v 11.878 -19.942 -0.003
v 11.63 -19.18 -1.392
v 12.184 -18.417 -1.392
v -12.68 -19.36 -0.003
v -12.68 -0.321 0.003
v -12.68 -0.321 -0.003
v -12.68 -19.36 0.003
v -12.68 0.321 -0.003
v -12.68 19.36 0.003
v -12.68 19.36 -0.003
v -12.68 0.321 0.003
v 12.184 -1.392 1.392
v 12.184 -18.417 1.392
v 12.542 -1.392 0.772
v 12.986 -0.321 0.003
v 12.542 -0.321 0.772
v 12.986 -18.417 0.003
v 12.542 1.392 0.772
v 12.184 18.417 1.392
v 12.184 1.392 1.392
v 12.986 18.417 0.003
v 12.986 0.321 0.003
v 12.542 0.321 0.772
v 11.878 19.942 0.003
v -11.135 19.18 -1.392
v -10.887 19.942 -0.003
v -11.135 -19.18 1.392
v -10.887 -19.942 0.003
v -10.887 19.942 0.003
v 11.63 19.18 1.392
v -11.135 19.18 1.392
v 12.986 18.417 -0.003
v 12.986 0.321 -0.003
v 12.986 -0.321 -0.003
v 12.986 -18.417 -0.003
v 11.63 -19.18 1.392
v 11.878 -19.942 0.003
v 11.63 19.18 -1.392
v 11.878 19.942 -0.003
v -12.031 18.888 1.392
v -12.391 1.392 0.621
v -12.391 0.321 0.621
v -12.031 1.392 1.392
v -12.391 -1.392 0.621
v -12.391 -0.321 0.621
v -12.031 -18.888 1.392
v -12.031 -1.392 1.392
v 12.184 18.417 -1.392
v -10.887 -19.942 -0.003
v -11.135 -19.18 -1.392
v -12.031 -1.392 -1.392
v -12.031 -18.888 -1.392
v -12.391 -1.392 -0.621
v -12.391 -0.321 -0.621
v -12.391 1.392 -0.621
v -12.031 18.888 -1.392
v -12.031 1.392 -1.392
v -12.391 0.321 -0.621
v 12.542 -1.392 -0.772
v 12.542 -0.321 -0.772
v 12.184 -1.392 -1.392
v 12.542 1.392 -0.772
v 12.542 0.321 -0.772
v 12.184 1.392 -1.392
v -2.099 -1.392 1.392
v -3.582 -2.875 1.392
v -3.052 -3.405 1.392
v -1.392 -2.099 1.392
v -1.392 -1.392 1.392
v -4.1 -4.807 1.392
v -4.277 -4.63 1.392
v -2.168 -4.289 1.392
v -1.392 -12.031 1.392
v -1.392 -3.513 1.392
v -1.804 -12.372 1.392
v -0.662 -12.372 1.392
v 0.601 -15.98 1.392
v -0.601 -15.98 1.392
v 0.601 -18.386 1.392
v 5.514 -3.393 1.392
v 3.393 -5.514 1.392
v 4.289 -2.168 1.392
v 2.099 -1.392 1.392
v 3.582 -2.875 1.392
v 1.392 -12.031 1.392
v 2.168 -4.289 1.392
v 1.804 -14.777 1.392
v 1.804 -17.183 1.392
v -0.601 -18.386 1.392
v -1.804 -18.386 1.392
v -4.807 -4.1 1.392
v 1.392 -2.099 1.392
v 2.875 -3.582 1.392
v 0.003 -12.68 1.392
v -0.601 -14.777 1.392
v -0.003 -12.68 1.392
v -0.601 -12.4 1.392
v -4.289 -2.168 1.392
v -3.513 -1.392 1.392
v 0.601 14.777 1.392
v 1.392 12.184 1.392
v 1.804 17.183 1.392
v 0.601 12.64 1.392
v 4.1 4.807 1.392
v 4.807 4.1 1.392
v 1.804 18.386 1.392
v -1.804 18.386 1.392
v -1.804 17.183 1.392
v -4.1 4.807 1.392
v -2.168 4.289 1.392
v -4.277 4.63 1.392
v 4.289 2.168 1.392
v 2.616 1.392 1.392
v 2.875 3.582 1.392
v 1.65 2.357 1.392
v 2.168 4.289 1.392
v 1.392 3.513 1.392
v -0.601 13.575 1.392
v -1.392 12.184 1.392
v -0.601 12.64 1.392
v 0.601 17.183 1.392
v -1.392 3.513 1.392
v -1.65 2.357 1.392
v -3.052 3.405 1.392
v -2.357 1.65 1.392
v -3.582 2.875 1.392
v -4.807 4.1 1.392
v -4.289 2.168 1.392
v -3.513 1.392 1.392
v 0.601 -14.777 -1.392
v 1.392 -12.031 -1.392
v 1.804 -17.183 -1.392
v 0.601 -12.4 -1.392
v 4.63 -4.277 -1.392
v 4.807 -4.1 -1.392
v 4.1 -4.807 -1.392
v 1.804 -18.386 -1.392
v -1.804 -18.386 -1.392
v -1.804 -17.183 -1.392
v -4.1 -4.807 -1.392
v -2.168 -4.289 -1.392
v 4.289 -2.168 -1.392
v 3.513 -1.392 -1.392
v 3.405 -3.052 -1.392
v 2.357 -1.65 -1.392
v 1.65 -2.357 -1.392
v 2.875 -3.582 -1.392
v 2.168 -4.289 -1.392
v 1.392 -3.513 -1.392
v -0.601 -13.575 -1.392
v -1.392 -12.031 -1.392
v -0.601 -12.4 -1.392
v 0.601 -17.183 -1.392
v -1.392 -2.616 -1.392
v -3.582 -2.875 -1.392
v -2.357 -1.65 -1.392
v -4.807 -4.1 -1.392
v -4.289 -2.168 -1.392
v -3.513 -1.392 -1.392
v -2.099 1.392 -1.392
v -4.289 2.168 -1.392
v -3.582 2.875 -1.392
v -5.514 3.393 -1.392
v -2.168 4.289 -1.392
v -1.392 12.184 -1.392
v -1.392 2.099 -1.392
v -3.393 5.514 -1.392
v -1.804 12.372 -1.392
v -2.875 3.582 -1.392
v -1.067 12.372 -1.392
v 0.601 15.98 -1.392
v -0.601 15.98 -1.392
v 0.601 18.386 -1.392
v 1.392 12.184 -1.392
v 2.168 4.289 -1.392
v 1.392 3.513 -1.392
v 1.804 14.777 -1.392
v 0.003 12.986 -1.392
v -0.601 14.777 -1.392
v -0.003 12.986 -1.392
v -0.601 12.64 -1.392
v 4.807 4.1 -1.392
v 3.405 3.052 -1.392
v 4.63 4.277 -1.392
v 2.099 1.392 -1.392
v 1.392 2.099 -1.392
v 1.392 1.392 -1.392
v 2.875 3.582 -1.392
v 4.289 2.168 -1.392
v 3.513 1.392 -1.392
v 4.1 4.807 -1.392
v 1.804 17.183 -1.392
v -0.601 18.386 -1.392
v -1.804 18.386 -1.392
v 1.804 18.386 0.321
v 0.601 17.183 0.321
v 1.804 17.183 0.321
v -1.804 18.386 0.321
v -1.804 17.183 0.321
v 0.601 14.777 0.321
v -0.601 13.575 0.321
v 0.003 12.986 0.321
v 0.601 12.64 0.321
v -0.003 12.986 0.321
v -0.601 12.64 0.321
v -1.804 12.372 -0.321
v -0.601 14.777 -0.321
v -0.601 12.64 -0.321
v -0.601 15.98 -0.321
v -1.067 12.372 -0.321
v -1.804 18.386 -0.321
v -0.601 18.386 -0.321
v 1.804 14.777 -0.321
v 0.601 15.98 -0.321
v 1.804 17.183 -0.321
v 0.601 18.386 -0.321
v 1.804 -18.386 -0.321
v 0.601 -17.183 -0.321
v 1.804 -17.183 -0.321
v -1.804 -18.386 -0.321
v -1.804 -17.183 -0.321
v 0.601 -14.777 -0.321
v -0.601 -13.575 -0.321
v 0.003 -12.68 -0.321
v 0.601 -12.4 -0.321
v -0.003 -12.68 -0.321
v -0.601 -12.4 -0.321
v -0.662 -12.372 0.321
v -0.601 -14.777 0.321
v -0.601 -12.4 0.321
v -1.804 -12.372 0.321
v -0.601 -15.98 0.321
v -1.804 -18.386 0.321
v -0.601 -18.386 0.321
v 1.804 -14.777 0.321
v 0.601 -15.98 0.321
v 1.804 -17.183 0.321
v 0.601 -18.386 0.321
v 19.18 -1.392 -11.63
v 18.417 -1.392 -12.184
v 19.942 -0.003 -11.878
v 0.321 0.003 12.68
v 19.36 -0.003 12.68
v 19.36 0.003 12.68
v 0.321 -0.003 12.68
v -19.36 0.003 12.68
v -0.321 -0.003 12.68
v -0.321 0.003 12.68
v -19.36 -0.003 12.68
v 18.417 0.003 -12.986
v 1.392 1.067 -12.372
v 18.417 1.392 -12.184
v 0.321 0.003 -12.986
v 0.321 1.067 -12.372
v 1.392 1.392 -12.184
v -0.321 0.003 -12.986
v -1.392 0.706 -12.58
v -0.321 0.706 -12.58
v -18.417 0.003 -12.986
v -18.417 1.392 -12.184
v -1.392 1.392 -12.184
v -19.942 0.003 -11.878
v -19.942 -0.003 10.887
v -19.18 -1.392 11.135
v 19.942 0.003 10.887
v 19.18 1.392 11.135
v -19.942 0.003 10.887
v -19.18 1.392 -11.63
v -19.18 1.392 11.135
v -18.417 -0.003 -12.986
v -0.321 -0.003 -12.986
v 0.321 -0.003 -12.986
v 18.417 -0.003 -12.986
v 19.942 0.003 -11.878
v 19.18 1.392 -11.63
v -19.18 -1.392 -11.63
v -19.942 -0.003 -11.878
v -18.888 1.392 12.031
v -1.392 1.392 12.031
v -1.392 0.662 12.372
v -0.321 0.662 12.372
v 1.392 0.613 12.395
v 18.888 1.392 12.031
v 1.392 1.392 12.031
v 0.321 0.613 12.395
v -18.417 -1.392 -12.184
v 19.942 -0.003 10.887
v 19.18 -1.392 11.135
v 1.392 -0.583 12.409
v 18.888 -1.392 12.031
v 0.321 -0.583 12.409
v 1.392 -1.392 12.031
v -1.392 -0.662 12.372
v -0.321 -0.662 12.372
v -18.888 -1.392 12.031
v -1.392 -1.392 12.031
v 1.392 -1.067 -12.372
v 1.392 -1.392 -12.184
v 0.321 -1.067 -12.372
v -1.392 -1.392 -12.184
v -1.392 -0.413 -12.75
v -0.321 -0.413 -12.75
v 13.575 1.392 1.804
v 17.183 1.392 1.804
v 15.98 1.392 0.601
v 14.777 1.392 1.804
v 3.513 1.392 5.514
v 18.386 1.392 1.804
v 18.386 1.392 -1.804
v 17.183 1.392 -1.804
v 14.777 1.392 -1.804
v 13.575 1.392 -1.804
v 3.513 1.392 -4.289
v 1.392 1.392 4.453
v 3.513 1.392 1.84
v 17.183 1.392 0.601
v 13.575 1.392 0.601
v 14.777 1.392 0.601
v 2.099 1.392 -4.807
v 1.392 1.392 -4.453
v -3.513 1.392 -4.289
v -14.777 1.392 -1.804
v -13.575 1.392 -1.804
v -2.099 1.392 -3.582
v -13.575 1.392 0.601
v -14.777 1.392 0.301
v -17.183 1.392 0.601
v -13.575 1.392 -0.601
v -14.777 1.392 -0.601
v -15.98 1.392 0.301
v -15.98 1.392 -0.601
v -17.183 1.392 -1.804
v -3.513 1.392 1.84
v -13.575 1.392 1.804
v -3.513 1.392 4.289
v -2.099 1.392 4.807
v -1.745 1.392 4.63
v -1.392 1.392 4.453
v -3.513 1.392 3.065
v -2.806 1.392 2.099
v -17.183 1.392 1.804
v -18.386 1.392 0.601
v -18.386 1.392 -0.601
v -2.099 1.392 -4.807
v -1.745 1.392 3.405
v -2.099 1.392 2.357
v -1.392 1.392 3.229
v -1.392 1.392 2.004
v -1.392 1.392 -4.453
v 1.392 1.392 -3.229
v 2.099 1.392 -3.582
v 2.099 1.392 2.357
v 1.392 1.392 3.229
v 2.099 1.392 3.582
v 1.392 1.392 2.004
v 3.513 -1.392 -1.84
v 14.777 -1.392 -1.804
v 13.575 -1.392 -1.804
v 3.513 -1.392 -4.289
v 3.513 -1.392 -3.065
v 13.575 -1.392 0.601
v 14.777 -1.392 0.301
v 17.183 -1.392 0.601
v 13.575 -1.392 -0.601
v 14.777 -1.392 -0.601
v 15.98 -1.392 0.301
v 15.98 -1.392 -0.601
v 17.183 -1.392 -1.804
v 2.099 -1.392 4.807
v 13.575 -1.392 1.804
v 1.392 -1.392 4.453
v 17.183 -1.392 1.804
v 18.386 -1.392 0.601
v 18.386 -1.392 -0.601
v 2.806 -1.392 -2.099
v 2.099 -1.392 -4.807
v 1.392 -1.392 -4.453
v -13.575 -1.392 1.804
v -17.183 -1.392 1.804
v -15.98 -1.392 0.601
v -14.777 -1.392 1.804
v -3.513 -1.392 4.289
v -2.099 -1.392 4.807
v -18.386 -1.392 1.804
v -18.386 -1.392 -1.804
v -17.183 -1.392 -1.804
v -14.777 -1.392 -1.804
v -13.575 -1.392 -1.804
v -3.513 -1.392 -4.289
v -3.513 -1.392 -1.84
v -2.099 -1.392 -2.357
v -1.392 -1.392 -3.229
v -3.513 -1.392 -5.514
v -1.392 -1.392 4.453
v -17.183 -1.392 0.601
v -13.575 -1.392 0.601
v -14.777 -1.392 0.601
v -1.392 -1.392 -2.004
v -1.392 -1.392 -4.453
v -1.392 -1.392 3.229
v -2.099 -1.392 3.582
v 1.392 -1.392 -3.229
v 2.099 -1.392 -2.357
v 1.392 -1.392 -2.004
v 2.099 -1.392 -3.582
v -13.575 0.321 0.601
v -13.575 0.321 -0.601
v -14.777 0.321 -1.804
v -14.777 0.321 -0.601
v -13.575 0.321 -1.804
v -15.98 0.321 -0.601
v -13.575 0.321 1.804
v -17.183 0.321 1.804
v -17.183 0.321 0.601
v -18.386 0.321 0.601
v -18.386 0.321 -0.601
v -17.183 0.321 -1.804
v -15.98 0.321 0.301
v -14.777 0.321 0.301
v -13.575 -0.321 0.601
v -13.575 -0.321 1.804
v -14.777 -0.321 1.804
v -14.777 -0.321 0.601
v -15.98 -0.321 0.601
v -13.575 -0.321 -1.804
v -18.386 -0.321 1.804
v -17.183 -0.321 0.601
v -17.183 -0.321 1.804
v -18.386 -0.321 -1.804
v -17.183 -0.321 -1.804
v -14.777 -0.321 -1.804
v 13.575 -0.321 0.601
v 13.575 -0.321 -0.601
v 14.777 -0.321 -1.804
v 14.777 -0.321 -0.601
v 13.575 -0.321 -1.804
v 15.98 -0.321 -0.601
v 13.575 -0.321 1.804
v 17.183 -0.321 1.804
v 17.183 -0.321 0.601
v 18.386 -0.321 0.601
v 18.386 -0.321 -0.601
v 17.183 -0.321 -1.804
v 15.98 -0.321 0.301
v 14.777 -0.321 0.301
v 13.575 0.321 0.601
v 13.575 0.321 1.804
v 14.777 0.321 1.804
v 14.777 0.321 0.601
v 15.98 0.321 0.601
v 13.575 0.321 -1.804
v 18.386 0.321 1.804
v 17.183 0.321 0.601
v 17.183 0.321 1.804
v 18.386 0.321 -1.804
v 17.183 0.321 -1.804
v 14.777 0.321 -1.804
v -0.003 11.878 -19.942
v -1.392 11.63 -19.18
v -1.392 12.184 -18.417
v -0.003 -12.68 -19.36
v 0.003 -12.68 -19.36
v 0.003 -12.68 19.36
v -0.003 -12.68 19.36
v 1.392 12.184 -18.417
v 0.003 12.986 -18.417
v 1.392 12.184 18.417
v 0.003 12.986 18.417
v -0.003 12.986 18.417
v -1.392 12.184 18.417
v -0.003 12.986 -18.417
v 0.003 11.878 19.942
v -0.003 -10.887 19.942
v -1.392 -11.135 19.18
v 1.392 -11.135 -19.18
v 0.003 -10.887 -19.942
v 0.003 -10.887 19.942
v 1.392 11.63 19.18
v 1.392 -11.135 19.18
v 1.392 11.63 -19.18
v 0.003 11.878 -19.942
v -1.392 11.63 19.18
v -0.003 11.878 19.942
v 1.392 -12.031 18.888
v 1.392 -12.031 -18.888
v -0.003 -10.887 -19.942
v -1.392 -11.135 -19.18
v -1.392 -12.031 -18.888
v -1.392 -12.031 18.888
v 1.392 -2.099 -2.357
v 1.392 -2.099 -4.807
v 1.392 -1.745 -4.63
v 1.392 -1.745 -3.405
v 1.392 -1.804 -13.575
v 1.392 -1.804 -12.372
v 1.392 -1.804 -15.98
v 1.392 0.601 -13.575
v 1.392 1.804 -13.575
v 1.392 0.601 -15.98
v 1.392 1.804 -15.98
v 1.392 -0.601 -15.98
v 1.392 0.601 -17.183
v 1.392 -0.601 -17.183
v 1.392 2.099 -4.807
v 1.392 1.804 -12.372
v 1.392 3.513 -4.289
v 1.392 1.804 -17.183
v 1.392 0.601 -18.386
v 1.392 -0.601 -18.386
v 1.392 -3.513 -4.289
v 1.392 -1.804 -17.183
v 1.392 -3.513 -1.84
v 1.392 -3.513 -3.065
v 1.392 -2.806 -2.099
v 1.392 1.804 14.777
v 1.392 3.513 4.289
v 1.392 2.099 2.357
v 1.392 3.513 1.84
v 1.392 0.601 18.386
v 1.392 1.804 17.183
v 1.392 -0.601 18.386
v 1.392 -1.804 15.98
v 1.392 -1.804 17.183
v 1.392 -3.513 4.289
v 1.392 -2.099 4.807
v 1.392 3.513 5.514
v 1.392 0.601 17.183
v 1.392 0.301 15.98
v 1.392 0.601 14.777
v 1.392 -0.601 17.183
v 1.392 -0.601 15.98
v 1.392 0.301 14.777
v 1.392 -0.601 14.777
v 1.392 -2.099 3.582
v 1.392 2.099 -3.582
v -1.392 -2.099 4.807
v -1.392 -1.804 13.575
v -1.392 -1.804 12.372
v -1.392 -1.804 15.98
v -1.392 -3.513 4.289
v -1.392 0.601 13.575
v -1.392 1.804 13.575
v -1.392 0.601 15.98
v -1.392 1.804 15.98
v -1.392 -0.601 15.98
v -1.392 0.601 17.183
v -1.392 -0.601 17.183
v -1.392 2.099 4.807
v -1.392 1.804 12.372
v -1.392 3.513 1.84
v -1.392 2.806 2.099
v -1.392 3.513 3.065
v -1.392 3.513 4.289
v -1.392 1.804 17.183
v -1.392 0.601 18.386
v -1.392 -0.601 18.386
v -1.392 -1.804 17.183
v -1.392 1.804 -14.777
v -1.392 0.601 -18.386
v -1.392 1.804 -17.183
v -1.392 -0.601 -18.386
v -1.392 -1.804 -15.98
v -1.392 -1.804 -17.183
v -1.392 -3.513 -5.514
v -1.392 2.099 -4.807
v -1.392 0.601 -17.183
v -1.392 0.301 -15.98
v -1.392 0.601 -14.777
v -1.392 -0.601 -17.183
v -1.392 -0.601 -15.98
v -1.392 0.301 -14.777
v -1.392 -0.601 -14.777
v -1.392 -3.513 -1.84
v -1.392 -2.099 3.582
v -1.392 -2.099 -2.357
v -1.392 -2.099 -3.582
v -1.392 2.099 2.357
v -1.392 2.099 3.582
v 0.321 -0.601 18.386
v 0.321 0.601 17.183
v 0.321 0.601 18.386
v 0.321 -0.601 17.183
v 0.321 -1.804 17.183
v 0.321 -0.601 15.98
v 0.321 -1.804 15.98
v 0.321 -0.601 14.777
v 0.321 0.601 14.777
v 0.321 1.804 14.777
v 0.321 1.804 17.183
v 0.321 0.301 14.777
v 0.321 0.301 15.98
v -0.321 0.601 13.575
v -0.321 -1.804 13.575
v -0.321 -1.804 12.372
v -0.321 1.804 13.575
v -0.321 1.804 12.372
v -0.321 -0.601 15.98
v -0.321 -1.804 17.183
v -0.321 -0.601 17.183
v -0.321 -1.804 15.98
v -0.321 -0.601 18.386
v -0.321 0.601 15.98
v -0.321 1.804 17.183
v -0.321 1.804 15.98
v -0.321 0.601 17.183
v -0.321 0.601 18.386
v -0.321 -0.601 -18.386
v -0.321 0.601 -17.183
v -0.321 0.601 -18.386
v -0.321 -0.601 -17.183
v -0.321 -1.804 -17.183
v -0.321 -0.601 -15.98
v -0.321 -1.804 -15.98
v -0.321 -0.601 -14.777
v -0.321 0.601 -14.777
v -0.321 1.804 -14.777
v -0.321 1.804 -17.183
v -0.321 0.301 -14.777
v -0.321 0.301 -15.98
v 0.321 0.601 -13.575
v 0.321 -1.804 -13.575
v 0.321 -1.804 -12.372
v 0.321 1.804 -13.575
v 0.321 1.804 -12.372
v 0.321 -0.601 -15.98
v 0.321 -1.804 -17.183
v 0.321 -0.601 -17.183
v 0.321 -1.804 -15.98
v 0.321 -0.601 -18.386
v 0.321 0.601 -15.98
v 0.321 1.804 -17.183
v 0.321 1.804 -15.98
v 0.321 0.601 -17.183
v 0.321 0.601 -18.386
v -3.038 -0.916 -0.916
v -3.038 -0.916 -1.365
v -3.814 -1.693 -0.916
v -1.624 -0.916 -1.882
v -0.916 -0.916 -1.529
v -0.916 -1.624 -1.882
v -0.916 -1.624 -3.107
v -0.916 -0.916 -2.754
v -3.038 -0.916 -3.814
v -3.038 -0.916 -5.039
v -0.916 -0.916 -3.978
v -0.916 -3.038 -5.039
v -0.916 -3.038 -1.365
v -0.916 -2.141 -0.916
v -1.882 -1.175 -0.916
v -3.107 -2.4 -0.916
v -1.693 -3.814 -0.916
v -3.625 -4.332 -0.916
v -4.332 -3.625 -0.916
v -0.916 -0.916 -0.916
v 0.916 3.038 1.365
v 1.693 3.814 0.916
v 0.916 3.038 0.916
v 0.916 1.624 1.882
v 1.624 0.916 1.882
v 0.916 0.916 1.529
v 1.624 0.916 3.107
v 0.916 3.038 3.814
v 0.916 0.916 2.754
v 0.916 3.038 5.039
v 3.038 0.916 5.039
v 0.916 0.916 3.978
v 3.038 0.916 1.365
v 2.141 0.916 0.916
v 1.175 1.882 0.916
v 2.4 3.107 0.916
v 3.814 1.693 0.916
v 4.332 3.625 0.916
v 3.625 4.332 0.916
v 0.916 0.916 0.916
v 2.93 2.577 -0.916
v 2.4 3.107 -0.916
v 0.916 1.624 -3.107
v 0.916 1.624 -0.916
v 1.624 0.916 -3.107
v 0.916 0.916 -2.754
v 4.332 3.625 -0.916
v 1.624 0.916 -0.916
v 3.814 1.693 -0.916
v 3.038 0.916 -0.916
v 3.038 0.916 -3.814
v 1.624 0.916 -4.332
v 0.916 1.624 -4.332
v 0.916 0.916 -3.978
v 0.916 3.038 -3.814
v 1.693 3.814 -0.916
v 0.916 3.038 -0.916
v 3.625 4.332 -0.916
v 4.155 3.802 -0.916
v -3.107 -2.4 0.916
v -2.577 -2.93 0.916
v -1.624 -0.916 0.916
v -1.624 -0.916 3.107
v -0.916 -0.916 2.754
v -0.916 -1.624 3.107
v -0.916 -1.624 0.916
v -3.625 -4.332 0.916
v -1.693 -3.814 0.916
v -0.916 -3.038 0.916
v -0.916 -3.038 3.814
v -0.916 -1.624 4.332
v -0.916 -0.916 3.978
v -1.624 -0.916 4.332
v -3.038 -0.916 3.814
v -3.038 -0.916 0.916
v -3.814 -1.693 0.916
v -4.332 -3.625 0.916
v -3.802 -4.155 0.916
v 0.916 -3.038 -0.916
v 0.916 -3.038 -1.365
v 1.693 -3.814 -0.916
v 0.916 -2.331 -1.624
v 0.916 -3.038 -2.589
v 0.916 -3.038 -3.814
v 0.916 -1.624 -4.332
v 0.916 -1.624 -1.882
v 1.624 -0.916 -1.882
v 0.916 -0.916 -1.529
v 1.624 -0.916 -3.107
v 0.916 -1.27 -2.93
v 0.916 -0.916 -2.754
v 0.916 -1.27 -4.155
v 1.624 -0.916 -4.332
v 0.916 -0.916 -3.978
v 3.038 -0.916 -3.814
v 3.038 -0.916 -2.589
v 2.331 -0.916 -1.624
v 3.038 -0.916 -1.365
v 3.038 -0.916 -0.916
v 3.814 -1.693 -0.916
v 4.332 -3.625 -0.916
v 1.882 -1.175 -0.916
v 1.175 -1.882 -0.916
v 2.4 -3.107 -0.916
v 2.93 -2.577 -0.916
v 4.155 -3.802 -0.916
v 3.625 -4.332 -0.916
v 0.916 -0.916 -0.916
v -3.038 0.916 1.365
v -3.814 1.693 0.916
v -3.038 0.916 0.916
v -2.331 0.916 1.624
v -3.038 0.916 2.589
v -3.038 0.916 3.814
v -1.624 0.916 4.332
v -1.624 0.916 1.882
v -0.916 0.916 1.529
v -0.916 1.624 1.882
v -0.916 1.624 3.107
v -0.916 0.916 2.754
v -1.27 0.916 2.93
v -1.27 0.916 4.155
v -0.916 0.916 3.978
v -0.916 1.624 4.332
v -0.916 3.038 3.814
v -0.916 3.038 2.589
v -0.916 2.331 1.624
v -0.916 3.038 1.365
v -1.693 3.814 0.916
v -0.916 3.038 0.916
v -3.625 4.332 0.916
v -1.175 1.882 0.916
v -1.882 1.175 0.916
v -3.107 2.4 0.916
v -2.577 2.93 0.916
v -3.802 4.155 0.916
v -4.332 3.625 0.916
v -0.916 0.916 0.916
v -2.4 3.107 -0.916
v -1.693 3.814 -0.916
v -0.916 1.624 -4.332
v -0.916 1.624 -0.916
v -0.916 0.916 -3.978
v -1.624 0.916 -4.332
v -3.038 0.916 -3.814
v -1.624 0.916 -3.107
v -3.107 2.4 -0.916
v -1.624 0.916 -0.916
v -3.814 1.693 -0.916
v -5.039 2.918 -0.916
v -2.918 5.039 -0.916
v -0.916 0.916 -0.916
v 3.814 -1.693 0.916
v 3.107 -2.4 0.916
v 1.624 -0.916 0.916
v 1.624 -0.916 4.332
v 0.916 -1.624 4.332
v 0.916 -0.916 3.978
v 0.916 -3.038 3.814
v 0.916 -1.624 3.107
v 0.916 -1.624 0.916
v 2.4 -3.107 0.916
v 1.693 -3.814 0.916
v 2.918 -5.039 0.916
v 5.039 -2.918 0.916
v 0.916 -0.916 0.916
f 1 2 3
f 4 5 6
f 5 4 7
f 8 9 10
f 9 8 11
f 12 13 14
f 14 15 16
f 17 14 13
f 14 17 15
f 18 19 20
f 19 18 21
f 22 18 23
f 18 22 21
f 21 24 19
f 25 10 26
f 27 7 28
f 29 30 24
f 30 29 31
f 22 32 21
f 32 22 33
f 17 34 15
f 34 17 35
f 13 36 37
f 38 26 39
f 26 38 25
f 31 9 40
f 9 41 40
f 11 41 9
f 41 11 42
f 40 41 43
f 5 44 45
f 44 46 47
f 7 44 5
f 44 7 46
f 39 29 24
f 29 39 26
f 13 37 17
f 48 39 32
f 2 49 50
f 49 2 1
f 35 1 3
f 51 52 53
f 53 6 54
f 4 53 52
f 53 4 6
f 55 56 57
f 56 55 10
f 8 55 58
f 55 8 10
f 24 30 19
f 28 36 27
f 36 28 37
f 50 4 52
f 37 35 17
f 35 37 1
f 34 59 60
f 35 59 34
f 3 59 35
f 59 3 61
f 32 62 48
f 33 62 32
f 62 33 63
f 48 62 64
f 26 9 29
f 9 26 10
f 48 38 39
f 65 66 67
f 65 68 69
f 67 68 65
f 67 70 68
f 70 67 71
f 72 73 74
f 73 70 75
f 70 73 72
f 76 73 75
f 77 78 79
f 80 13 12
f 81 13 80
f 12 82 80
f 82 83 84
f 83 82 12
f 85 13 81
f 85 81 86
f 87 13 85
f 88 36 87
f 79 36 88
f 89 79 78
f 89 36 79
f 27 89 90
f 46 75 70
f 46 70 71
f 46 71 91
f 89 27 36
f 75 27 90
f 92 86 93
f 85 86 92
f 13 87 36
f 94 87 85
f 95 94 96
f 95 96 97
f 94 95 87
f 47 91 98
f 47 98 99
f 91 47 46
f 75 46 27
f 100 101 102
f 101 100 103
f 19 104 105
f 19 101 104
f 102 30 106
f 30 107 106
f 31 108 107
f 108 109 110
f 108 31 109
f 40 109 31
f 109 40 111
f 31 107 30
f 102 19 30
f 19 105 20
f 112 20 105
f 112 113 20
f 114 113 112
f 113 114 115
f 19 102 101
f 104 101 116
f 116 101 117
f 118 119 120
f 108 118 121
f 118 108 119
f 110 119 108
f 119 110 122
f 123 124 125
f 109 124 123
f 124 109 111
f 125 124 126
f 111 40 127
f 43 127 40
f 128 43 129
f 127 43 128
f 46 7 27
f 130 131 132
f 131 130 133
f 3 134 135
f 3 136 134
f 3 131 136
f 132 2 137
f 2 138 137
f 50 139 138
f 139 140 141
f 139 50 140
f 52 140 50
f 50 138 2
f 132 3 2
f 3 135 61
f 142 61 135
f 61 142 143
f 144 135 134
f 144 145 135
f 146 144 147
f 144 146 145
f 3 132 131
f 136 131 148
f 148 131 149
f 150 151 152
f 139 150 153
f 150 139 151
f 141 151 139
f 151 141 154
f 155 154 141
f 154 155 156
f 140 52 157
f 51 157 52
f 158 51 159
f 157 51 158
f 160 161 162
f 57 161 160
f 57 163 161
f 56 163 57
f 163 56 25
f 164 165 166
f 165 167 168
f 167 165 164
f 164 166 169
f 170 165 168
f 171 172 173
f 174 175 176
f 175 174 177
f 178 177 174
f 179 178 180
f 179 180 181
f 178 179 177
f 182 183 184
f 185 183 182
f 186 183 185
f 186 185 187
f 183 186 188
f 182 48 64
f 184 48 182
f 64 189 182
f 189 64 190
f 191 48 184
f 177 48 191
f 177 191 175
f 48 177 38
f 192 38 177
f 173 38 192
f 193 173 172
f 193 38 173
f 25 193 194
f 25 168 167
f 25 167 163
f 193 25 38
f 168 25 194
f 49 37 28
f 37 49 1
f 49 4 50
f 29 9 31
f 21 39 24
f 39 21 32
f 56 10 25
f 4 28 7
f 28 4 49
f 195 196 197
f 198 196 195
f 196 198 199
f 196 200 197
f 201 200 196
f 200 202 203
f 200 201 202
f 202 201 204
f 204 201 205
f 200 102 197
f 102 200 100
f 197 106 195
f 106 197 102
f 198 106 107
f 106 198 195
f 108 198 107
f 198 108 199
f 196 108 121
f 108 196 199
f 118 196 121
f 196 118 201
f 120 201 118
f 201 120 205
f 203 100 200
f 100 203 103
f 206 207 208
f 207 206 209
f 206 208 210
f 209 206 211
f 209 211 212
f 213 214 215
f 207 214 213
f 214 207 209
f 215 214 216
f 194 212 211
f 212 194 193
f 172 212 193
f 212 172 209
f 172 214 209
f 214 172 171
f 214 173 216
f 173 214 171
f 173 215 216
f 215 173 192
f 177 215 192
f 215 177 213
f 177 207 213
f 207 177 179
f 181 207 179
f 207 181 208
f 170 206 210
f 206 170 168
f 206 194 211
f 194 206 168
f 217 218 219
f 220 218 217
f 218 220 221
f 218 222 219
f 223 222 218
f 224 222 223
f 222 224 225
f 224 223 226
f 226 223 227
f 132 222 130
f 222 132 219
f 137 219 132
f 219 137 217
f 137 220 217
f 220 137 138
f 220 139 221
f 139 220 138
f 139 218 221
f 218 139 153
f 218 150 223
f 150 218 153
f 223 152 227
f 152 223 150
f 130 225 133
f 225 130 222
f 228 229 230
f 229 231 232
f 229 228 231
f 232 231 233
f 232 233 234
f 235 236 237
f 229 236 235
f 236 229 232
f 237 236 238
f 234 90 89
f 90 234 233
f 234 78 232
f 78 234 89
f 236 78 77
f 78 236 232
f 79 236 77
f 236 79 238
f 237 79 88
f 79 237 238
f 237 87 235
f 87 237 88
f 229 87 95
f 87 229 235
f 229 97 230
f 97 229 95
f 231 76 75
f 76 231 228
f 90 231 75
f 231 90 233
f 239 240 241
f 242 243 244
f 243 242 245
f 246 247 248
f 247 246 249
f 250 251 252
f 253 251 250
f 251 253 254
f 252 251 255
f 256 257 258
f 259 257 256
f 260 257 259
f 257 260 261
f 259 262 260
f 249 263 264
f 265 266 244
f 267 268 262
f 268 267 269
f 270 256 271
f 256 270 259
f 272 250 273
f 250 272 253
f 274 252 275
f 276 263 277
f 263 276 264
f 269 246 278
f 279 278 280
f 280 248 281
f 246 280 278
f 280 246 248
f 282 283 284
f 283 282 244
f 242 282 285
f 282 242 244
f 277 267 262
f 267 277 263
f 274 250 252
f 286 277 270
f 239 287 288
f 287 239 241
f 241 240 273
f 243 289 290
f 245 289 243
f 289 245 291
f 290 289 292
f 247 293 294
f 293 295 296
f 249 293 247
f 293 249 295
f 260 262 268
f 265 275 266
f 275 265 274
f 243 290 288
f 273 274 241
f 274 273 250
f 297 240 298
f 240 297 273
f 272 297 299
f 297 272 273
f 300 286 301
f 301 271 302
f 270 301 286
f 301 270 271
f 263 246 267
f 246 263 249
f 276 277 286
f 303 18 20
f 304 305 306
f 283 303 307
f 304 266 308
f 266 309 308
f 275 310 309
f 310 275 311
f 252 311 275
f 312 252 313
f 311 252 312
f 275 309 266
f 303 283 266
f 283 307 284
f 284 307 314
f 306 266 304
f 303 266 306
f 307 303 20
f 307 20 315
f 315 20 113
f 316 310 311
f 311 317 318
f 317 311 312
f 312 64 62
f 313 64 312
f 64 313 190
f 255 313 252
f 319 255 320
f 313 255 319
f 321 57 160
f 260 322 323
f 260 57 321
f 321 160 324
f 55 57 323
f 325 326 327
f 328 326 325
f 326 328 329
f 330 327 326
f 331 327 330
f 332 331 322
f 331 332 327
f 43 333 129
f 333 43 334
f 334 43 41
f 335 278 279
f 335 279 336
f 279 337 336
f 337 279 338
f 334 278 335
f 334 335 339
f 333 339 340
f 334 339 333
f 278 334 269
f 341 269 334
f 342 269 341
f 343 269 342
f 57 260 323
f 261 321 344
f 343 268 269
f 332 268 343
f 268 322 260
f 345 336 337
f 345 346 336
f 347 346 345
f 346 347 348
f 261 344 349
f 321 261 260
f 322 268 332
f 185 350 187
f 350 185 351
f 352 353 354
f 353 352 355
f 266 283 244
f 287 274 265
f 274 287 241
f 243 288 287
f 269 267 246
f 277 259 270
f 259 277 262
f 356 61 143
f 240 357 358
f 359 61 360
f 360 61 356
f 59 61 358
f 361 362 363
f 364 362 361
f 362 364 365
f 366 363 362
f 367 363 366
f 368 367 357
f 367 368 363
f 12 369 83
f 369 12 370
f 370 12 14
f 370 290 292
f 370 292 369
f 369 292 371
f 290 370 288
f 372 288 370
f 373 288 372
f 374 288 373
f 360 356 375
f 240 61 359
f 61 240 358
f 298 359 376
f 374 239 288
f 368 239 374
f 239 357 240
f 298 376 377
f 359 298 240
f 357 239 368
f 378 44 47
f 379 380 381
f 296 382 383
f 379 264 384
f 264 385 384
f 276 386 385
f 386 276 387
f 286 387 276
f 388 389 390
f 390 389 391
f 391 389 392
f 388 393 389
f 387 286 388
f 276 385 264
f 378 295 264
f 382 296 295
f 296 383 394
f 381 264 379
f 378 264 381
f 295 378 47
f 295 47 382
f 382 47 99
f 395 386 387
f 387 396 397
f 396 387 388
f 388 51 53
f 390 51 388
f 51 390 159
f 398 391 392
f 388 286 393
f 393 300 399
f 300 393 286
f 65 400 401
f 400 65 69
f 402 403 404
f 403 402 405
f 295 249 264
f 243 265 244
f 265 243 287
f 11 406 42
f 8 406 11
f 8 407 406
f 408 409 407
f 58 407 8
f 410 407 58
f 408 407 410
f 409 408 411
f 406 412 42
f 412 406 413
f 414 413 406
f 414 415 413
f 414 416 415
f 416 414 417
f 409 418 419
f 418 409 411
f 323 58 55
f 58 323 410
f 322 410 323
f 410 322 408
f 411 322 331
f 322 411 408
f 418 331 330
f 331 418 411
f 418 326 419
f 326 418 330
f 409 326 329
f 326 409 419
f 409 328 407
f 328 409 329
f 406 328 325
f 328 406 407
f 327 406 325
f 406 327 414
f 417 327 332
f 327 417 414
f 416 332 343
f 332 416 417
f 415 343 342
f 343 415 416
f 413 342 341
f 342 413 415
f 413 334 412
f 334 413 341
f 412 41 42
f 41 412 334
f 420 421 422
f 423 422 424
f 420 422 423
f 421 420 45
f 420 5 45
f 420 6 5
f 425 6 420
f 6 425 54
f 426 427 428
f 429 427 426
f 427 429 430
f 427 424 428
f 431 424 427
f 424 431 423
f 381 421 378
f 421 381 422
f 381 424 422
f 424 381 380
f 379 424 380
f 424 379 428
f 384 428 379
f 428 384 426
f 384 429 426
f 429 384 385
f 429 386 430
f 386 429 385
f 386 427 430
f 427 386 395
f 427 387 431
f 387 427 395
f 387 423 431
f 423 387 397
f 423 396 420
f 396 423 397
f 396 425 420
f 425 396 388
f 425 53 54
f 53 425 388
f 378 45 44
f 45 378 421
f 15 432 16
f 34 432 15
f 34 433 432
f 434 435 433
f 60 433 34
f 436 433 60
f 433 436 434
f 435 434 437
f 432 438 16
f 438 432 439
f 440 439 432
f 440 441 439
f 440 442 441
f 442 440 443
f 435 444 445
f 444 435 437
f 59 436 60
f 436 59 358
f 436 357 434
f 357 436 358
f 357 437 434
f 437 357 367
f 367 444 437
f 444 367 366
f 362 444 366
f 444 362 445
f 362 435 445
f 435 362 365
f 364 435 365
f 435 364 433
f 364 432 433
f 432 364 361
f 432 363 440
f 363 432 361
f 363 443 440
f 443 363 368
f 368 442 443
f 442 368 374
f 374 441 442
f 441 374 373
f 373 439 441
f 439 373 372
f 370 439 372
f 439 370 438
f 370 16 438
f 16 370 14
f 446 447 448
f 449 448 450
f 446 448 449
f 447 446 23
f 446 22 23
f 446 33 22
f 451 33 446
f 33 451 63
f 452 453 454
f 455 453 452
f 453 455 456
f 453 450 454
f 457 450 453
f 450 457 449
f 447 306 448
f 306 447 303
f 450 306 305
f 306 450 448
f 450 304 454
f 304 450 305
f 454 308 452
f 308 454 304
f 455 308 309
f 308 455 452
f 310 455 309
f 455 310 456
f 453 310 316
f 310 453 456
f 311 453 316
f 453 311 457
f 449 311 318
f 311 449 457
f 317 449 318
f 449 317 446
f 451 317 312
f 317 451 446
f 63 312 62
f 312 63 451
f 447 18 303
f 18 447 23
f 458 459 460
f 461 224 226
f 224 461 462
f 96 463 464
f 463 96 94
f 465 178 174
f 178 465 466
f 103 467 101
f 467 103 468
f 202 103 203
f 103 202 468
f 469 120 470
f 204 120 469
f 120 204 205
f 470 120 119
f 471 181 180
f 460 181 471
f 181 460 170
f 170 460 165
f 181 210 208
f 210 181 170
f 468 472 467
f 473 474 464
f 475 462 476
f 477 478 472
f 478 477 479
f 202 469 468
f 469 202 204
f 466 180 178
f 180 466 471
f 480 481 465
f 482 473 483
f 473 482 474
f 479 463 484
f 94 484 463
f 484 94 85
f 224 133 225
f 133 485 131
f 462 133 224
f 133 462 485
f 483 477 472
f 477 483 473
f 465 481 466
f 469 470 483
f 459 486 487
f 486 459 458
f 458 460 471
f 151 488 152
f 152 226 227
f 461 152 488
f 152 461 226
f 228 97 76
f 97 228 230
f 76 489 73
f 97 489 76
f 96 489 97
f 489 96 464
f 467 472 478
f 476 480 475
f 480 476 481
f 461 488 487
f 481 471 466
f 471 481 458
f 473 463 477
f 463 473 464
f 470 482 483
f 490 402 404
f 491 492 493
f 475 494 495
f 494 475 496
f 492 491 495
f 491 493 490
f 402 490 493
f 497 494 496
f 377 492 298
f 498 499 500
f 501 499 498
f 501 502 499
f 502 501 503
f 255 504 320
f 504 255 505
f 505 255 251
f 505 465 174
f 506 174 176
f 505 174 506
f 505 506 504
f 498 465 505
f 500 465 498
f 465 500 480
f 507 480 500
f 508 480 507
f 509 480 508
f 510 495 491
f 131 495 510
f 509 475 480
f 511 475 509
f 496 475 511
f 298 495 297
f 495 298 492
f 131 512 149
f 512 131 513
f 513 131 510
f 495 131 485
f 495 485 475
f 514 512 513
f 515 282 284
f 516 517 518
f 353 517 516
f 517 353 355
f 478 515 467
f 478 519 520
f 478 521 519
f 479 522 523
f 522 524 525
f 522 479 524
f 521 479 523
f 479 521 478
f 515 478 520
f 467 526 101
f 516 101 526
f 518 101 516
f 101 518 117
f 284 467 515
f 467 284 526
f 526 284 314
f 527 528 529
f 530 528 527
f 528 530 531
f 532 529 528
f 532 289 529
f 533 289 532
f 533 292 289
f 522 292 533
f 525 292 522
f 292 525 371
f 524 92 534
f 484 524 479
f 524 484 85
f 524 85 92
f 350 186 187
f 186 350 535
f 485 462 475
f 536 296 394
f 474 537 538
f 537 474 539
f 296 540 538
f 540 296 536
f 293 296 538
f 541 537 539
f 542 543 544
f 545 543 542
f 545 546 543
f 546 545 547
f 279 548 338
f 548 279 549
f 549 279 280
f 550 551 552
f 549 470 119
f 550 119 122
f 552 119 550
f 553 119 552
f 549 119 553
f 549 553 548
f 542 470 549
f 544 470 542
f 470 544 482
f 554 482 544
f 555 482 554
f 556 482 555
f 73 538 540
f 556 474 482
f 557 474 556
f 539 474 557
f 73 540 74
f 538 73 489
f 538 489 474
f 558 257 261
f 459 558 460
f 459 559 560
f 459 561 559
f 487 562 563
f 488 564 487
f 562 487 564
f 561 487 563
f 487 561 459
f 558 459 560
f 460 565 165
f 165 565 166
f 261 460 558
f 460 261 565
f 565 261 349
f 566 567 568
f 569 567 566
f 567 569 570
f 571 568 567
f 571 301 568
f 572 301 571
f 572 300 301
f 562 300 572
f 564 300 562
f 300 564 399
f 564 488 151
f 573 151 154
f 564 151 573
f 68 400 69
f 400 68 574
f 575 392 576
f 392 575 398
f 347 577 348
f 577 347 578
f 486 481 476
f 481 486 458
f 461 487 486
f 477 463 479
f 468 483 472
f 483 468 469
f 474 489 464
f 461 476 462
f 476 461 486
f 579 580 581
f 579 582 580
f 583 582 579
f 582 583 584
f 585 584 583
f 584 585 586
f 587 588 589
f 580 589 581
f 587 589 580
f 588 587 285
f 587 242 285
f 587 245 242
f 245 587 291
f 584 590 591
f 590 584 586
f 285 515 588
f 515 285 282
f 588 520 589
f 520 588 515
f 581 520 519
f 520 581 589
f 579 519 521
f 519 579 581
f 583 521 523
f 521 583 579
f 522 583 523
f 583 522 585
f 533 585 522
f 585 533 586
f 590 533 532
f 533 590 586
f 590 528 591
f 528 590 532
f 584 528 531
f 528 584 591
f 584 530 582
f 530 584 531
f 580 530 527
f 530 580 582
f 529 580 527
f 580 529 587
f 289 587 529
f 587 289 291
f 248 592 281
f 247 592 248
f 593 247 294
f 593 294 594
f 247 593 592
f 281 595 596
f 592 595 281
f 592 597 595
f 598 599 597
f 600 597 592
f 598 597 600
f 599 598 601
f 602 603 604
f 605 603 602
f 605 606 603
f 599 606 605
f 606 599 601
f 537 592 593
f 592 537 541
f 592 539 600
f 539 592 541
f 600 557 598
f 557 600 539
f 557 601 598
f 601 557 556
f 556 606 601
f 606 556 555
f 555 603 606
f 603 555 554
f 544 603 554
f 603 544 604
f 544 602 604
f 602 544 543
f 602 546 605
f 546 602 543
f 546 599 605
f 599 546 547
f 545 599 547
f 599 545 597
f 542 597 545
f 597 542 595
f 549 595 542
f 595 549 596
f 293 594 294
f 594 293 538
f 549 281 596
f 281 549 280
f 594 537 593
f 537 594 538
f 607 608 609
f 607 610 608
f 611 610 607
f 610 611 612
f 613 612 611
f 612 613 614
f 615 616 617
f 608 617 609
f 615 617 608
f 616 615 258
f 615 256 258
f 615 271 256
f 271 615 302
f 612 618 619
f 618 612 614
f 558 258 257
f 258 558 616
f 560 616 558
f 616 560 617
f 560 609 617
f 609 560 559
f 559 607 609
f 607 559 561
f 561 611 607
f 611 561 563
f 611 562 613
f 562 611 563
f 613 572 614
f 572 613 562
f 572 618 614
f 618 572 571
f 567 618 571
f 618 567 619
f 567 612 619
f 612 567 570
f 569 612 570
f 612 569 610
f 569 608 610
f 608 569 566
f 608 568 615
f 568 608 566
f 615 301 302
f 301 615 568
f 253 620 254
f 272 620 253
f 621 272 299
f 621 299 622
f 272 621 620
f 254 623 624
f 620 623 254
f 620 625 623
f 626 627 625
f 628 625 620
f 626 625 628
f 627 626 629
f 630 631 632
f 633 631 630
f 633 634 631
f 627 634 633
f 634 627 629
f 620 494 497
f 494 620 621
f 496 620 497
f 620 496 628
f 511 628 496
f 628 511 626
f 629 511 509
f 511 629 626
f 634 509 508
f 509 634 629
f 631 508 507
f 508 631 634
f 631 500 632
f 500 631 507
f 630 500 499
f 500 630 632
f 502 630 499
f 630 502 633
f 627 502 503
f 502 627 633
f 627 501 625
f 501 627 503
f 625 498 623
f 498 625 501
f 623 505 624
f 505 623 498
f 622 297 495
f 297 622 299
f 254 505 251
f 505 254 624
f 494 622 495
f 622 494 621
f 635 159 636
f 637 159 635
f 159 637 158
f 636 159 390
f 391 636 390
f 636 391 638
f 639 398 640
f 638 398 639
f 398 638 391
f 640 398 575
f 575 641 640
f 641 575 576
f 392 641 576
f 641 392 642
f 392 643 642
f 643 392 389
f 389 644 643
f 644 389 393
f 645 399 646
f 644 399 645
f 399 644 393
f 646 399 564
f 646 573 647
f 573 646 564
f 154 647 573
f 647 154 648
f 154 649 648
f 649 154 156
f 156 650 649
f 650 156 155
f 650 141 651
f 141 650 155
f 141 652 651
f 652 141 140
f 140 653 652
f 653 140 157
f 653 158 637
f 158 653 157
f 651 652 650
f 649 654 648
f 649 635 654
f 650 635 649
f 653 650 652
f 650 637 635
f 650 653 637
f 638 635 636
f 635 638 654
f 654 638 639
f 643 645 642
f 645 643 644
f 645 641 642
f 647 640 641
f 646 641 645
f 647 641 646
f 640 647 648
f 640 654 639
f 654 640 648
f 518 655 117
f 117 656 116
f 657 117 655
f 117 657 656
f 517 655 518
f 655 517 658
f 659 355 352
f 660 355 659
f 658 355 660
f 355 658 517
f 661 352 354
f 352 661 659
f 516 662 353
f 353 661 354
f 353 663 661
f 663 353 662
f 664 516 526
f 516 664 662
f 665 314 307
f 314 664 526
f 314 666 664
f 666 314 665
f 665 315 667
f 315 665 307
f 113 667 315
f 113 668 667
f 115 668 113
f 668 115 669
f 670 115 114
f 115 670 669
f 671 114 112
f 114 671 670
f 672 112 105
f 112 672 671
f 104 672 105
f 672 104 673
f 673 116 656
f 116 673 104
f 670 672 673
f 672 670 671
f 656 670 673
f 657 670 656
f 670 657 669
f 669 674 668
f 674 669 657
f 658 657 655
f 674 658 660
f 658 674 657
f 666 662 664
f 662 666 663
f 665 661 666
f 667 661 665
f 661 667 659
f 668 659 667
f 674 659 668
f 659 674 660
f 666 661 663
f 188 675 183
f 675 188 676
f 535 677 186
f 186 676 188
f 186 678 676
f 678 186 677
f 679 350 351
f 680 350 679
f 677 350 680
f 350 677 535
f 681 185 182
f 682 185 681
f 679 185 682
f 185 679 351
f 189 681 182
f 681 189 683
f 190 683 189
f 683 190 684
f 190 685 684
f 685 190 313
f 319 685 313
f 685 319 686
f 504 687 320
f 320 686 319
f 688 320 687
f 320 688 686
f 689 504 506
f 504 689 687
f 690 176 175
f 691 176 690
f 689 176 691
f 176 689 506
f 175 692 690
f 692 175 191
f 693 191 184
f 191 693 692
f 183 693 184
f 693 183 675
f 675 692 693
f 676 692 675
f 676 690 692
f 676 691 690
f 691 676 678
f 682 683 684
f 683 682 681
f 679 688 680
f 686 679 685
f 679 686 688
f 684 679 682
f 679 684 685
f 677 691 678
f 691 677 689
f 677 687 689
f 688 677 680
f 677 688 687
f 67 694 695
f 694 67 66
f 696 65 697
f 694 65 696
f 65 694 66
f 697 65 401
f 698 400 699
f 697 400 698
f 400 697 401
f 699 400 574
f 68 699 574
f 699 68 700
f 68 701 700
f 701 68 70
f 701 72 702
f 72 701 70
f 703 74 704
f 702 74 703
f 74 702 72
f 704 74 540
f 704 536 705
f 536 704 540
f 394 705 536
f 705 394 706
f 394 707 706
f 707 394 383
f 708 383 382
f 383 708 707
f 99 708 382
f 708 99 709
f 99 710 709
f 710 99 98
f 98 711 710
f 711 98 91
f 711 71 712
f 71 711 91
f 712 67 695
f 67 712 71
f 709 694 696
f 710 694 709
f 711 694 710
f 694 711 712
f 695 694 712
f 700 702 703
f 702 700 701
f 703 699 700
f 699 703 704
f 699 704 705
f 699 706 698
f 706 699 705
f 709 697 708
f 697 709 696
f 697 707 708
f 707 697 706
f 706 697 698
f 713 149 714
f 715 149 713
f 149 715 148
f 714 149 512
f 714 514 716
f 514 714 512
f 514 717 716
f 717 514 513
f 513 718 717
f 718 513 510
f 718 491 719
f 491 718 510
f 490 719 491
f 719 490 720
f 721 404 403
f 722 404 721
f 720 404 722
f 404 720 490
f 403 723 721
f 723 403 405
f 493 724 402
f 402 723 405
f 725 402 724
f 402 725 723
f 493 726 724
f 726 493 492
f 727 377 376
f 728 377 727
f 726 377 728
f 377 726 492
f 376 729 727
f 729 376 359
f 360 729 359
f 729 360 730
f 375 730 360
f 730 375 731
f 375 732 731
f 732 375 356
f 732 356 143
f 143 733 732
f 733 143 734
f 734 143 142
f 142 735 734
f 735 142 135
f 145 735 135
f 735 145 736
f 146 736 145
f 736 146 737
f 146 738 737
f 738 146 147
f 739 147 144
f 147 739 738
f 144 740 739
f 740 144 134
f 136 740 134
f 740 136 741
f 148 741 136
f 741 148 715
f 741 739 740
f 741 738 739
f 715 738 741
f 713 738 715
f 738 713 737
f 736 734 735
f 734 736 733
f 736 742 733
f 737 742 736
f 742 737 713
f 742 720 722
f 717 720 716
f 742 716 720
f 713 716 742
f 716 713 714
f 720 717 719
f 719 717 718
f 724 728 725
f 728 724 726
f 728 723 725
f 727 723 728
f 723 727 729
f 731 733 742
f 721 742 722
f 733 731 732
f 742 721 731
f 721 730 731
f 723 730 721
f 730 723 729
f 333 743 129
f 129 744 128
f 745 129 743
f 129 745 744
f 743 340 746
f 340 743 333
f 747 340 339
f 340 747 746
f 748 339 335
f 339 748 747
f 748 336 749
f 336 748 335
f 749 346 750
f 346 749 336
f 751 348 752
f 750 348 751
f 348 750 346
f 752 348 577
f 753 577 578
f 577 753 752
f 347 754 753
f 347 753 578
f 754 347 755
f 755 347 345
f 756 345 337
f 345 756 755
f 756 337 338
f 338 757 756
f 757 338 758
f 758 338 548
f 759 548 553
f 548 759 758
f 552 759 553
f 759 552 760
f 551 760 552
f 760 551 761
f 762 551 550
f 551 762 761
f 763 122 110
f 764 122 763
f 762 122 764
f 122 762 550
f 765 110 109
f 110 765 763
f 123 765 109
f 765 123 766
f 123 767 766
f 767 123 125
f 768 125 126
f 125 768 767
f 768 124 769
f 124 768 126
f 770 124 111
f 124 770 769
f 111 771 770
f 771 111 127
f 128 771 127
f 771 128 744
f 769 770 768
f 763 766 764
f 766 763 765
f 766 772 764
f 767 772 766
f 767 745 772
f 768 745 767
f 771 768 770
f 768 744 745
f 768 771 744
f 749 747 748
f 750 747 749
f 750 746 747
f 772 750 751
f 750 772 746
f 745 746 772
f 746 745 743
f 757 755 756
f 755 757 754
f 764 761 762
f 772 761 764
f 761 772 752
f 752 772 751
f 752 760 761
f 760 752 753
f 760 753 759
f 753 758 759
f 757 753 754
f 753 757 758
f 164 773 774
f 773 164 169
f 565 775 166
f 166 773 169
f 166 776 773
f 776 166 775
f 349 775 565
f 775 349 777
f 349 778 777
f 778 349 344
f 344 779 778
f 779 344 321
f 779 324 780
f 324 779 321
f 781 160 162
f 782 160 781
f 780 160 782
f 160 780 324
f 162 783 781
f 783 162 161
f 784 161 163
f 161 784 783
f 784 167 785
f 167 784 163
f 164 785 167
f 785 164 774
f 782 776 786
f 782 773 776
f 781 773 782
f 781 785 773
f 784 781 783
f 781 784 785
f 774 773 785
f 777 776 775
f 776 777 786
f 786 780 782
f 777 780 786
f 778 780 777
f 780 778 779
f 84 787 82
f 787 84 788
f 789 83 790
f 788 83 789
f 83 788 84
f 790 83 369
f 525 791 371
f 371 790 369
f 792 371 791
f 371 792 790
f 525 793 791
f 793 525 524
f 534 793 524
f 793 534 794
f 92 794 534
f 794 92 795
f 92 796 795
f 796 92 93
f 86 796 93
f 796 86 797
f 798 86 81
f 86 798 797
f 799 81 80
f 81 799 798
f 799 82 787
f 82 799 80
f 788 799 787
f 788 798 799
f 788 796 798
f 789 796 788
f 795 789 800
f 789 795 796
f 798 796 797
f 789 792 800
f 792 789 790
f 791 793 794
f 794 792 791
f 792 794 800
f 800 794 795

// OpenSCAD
diameter = 25*sqrt(3);
plane_thickness = diameter/27;
halfplane_emboss = plane_thickness / 5;
center_emboss = plane_thickness * 4/7;

module plane(){
	minkowski(){
 		linear_extrude(height=plane_thickness /300, center=true){
			child(0);
		}
		sphere(plane_thickness, $fn = 5);
	}
}

module halfplane(){
        translate([0,0,halfplane_emboss]){
	    linear_extrude(height=plane_thickness, center=false){
		child(0);
	    }
	}
}



module place(dir, dist=2/7){
f = diameter/36;
	rotate(dir){
	translate([0,diameter*dist,0]){
	halfplane(){
	scale([f,f,f]){
		translate([-1.5,0,0]){
			child(0);
		}
	}
	}
	}
	}
}


module corner(angle=[atan(sqrt(2)),0,45], doclip=true){
   rotate(angle){
     intersection(){
//     union(){
       linear_extrude(height=diameter){
	translate([-1.5,-2.5,0]){
		child(0);
	}
       }
       rotate([-atan(sqrt(2)),0,0]){
       rotate([0,0,-135]){
       translate([center_emboss, center_emboss, center_emboss]){
       cube(size = diameter/2);
       }
       }
       }
     }
   }
}

module two_digits(){
	union(){
		translate([-2,0,0]){child(0);}
		translate([2,0,0]){child(1);}
	}
}

module ico_rec(){
	plane(){
		square([diameter * side, diameter * side * phi], center=true);
	}
}

one = [
	[0,0],[0,1],[1,1],[1,4],[0,4],[1,5],[2,5],[2,1],[3,1],[3,0]
];
two = [
	[0,0],[0,1],[2,3],[2,4],[1,4],[1,3],[0,3],[0,4],[1,5],[2,5],[3,4],[3,3],[1,1],[3,1],[3,0]
];
three = [
	[0,1],[2,1],[2,2],[0,2],[2,4],[0,4],[0,5],[3,5],[3,4],[2,3],[3,2],[3,1],[2,0],[1,0]
];
four = [
	[3,0],[2,0],[2,2],[0,2],[0,4],[1,5],[1,3],[2,3],[2,5],[3,5]
];
five = [
	[0,1],[2,1],[2,2],[0,2],[0,4],[0,5],[3,5],[3,4],[1,4],[1,3],[2,3],[3,2],[3,1],[2,0],[1,0]
];
six = [
	[0,1],[0,4,],[1,5,],[2,5,],[3,4],[1,4],[1,1],[2,1],[2,2],[1.25,2],[1.25,3],[2,3],[3,2],[3,1],[2,0],[1.55,0],[2,-0.5],[1.5,-1],[1,-0.5],[1.45,0],[1,0]
];
seven = [
	[1,0],[1,1],[2,4],[0,4],[0,5],[3,5],[3,4],[2,2],[2,0]
];
eight = [
	[0,1],[0,2],[.5,2.5],[0,3],[0,4],[1,5],[1.75,5],[1.75,4],[1,4],[1,3],[2,3],[2,5],[3,4],[3,3],[2.5,2.5],[3,2],[3,1],[2,0],[1.25,0],[1.25,1],[2,1],[2,2],[1,2],[1,0]
];
nine = [
	[1,0],[2,2],[2,4],[1,4],[1,3],[1.75,3],[1.75,2],[1,2],[0,3],[0,4],[1,5],[2,5],[3,4],[3,2],[2,0],[1.55,0],[2,-0.5],[1.5,-1],[1,-0.5],[1.45,0]
];
zero = [
	[0,1],[0,4],[1,5],[2,5],[3,4],[3,1],[2,0],[2,4],[1,4],[1,1],[1.75,1],[1.75,0],[1,0]
];

target = [
	[1.495, 5],
	[1.25,4],
	[1.75,4],
	[1.505, 5],
	[1.5 + 1.25*sqrt(3),1.255],
	[3,1.75],
	[3,1.5],
	[2.5,1.5],
	[1.5 + 1.25*sqrt(3),1.245],
	[1.5 - 1.25*sqrt(3),1.245],
	[0.5,1.5],
	[0,1.5],
	[0.5,1.75],
	[0,1.65],
	[1.5 - 1.25*sqrt(3),1.255]
];

phi = (1 + sqrt(5)) / 2;
side = 1/sqrt(pow(phi,2) + 1);

color("", 0.95){
//  union(){  
  difference(){ 
      union(){
	difference(){
		ico_rec();
		place([0,0,0]){polygon(seven);}
		place([0,180,0]){polygon(four);}
		place([180,0,0]){polygon(seven);}
		place([180,180,0]){polygon(four);}
	}
	rotate([0,90,90]){
	difference(){
		ico_rec();
		place([0,0,0]){polygon(six);}
		place([0,180,0]){polygon(three);}
		place([180,0,0]){polygon(six);}
		place([180,180,0]){polygon(three);}
	}
	}
	rotate([90,0,90]){
	difference(){
		ico_rec();
		place([0,0,0]){polygon(nine);}
		place([0,180,0]){polygon(two);}
		place([180,0,0]){polygon(nine);}
		place([180,180,0]){polygon(two);}
	}
	}
     }
     corner([atan(sqrt(2)),180,-45]){
         polygon(five);
     }
     corner([atan(sqrt(2)),0,-45 + 180]){
         polygon(five);
     }
     corner([atan(sqrt(2)),180,-45 + 180]){
	 polygon(zero);
     }
     corner([atan(sqrt(2)),0,-45]){
	 polygon(zero);
     }
     corner([atan(sqrt(2)),180,45]){
	 polygon(eight);
     }
     corner([atan(sqrt(2)),0,45 + 180]){
	 polygon(eight);
     }
     corner([atan(sqrt(2)),180,45 + 180]){
	 polygon(one);
     }
     corner([atan(sqrt(2)),0,45]){
         polygon(one);
     }
/*
*/
  }
}
